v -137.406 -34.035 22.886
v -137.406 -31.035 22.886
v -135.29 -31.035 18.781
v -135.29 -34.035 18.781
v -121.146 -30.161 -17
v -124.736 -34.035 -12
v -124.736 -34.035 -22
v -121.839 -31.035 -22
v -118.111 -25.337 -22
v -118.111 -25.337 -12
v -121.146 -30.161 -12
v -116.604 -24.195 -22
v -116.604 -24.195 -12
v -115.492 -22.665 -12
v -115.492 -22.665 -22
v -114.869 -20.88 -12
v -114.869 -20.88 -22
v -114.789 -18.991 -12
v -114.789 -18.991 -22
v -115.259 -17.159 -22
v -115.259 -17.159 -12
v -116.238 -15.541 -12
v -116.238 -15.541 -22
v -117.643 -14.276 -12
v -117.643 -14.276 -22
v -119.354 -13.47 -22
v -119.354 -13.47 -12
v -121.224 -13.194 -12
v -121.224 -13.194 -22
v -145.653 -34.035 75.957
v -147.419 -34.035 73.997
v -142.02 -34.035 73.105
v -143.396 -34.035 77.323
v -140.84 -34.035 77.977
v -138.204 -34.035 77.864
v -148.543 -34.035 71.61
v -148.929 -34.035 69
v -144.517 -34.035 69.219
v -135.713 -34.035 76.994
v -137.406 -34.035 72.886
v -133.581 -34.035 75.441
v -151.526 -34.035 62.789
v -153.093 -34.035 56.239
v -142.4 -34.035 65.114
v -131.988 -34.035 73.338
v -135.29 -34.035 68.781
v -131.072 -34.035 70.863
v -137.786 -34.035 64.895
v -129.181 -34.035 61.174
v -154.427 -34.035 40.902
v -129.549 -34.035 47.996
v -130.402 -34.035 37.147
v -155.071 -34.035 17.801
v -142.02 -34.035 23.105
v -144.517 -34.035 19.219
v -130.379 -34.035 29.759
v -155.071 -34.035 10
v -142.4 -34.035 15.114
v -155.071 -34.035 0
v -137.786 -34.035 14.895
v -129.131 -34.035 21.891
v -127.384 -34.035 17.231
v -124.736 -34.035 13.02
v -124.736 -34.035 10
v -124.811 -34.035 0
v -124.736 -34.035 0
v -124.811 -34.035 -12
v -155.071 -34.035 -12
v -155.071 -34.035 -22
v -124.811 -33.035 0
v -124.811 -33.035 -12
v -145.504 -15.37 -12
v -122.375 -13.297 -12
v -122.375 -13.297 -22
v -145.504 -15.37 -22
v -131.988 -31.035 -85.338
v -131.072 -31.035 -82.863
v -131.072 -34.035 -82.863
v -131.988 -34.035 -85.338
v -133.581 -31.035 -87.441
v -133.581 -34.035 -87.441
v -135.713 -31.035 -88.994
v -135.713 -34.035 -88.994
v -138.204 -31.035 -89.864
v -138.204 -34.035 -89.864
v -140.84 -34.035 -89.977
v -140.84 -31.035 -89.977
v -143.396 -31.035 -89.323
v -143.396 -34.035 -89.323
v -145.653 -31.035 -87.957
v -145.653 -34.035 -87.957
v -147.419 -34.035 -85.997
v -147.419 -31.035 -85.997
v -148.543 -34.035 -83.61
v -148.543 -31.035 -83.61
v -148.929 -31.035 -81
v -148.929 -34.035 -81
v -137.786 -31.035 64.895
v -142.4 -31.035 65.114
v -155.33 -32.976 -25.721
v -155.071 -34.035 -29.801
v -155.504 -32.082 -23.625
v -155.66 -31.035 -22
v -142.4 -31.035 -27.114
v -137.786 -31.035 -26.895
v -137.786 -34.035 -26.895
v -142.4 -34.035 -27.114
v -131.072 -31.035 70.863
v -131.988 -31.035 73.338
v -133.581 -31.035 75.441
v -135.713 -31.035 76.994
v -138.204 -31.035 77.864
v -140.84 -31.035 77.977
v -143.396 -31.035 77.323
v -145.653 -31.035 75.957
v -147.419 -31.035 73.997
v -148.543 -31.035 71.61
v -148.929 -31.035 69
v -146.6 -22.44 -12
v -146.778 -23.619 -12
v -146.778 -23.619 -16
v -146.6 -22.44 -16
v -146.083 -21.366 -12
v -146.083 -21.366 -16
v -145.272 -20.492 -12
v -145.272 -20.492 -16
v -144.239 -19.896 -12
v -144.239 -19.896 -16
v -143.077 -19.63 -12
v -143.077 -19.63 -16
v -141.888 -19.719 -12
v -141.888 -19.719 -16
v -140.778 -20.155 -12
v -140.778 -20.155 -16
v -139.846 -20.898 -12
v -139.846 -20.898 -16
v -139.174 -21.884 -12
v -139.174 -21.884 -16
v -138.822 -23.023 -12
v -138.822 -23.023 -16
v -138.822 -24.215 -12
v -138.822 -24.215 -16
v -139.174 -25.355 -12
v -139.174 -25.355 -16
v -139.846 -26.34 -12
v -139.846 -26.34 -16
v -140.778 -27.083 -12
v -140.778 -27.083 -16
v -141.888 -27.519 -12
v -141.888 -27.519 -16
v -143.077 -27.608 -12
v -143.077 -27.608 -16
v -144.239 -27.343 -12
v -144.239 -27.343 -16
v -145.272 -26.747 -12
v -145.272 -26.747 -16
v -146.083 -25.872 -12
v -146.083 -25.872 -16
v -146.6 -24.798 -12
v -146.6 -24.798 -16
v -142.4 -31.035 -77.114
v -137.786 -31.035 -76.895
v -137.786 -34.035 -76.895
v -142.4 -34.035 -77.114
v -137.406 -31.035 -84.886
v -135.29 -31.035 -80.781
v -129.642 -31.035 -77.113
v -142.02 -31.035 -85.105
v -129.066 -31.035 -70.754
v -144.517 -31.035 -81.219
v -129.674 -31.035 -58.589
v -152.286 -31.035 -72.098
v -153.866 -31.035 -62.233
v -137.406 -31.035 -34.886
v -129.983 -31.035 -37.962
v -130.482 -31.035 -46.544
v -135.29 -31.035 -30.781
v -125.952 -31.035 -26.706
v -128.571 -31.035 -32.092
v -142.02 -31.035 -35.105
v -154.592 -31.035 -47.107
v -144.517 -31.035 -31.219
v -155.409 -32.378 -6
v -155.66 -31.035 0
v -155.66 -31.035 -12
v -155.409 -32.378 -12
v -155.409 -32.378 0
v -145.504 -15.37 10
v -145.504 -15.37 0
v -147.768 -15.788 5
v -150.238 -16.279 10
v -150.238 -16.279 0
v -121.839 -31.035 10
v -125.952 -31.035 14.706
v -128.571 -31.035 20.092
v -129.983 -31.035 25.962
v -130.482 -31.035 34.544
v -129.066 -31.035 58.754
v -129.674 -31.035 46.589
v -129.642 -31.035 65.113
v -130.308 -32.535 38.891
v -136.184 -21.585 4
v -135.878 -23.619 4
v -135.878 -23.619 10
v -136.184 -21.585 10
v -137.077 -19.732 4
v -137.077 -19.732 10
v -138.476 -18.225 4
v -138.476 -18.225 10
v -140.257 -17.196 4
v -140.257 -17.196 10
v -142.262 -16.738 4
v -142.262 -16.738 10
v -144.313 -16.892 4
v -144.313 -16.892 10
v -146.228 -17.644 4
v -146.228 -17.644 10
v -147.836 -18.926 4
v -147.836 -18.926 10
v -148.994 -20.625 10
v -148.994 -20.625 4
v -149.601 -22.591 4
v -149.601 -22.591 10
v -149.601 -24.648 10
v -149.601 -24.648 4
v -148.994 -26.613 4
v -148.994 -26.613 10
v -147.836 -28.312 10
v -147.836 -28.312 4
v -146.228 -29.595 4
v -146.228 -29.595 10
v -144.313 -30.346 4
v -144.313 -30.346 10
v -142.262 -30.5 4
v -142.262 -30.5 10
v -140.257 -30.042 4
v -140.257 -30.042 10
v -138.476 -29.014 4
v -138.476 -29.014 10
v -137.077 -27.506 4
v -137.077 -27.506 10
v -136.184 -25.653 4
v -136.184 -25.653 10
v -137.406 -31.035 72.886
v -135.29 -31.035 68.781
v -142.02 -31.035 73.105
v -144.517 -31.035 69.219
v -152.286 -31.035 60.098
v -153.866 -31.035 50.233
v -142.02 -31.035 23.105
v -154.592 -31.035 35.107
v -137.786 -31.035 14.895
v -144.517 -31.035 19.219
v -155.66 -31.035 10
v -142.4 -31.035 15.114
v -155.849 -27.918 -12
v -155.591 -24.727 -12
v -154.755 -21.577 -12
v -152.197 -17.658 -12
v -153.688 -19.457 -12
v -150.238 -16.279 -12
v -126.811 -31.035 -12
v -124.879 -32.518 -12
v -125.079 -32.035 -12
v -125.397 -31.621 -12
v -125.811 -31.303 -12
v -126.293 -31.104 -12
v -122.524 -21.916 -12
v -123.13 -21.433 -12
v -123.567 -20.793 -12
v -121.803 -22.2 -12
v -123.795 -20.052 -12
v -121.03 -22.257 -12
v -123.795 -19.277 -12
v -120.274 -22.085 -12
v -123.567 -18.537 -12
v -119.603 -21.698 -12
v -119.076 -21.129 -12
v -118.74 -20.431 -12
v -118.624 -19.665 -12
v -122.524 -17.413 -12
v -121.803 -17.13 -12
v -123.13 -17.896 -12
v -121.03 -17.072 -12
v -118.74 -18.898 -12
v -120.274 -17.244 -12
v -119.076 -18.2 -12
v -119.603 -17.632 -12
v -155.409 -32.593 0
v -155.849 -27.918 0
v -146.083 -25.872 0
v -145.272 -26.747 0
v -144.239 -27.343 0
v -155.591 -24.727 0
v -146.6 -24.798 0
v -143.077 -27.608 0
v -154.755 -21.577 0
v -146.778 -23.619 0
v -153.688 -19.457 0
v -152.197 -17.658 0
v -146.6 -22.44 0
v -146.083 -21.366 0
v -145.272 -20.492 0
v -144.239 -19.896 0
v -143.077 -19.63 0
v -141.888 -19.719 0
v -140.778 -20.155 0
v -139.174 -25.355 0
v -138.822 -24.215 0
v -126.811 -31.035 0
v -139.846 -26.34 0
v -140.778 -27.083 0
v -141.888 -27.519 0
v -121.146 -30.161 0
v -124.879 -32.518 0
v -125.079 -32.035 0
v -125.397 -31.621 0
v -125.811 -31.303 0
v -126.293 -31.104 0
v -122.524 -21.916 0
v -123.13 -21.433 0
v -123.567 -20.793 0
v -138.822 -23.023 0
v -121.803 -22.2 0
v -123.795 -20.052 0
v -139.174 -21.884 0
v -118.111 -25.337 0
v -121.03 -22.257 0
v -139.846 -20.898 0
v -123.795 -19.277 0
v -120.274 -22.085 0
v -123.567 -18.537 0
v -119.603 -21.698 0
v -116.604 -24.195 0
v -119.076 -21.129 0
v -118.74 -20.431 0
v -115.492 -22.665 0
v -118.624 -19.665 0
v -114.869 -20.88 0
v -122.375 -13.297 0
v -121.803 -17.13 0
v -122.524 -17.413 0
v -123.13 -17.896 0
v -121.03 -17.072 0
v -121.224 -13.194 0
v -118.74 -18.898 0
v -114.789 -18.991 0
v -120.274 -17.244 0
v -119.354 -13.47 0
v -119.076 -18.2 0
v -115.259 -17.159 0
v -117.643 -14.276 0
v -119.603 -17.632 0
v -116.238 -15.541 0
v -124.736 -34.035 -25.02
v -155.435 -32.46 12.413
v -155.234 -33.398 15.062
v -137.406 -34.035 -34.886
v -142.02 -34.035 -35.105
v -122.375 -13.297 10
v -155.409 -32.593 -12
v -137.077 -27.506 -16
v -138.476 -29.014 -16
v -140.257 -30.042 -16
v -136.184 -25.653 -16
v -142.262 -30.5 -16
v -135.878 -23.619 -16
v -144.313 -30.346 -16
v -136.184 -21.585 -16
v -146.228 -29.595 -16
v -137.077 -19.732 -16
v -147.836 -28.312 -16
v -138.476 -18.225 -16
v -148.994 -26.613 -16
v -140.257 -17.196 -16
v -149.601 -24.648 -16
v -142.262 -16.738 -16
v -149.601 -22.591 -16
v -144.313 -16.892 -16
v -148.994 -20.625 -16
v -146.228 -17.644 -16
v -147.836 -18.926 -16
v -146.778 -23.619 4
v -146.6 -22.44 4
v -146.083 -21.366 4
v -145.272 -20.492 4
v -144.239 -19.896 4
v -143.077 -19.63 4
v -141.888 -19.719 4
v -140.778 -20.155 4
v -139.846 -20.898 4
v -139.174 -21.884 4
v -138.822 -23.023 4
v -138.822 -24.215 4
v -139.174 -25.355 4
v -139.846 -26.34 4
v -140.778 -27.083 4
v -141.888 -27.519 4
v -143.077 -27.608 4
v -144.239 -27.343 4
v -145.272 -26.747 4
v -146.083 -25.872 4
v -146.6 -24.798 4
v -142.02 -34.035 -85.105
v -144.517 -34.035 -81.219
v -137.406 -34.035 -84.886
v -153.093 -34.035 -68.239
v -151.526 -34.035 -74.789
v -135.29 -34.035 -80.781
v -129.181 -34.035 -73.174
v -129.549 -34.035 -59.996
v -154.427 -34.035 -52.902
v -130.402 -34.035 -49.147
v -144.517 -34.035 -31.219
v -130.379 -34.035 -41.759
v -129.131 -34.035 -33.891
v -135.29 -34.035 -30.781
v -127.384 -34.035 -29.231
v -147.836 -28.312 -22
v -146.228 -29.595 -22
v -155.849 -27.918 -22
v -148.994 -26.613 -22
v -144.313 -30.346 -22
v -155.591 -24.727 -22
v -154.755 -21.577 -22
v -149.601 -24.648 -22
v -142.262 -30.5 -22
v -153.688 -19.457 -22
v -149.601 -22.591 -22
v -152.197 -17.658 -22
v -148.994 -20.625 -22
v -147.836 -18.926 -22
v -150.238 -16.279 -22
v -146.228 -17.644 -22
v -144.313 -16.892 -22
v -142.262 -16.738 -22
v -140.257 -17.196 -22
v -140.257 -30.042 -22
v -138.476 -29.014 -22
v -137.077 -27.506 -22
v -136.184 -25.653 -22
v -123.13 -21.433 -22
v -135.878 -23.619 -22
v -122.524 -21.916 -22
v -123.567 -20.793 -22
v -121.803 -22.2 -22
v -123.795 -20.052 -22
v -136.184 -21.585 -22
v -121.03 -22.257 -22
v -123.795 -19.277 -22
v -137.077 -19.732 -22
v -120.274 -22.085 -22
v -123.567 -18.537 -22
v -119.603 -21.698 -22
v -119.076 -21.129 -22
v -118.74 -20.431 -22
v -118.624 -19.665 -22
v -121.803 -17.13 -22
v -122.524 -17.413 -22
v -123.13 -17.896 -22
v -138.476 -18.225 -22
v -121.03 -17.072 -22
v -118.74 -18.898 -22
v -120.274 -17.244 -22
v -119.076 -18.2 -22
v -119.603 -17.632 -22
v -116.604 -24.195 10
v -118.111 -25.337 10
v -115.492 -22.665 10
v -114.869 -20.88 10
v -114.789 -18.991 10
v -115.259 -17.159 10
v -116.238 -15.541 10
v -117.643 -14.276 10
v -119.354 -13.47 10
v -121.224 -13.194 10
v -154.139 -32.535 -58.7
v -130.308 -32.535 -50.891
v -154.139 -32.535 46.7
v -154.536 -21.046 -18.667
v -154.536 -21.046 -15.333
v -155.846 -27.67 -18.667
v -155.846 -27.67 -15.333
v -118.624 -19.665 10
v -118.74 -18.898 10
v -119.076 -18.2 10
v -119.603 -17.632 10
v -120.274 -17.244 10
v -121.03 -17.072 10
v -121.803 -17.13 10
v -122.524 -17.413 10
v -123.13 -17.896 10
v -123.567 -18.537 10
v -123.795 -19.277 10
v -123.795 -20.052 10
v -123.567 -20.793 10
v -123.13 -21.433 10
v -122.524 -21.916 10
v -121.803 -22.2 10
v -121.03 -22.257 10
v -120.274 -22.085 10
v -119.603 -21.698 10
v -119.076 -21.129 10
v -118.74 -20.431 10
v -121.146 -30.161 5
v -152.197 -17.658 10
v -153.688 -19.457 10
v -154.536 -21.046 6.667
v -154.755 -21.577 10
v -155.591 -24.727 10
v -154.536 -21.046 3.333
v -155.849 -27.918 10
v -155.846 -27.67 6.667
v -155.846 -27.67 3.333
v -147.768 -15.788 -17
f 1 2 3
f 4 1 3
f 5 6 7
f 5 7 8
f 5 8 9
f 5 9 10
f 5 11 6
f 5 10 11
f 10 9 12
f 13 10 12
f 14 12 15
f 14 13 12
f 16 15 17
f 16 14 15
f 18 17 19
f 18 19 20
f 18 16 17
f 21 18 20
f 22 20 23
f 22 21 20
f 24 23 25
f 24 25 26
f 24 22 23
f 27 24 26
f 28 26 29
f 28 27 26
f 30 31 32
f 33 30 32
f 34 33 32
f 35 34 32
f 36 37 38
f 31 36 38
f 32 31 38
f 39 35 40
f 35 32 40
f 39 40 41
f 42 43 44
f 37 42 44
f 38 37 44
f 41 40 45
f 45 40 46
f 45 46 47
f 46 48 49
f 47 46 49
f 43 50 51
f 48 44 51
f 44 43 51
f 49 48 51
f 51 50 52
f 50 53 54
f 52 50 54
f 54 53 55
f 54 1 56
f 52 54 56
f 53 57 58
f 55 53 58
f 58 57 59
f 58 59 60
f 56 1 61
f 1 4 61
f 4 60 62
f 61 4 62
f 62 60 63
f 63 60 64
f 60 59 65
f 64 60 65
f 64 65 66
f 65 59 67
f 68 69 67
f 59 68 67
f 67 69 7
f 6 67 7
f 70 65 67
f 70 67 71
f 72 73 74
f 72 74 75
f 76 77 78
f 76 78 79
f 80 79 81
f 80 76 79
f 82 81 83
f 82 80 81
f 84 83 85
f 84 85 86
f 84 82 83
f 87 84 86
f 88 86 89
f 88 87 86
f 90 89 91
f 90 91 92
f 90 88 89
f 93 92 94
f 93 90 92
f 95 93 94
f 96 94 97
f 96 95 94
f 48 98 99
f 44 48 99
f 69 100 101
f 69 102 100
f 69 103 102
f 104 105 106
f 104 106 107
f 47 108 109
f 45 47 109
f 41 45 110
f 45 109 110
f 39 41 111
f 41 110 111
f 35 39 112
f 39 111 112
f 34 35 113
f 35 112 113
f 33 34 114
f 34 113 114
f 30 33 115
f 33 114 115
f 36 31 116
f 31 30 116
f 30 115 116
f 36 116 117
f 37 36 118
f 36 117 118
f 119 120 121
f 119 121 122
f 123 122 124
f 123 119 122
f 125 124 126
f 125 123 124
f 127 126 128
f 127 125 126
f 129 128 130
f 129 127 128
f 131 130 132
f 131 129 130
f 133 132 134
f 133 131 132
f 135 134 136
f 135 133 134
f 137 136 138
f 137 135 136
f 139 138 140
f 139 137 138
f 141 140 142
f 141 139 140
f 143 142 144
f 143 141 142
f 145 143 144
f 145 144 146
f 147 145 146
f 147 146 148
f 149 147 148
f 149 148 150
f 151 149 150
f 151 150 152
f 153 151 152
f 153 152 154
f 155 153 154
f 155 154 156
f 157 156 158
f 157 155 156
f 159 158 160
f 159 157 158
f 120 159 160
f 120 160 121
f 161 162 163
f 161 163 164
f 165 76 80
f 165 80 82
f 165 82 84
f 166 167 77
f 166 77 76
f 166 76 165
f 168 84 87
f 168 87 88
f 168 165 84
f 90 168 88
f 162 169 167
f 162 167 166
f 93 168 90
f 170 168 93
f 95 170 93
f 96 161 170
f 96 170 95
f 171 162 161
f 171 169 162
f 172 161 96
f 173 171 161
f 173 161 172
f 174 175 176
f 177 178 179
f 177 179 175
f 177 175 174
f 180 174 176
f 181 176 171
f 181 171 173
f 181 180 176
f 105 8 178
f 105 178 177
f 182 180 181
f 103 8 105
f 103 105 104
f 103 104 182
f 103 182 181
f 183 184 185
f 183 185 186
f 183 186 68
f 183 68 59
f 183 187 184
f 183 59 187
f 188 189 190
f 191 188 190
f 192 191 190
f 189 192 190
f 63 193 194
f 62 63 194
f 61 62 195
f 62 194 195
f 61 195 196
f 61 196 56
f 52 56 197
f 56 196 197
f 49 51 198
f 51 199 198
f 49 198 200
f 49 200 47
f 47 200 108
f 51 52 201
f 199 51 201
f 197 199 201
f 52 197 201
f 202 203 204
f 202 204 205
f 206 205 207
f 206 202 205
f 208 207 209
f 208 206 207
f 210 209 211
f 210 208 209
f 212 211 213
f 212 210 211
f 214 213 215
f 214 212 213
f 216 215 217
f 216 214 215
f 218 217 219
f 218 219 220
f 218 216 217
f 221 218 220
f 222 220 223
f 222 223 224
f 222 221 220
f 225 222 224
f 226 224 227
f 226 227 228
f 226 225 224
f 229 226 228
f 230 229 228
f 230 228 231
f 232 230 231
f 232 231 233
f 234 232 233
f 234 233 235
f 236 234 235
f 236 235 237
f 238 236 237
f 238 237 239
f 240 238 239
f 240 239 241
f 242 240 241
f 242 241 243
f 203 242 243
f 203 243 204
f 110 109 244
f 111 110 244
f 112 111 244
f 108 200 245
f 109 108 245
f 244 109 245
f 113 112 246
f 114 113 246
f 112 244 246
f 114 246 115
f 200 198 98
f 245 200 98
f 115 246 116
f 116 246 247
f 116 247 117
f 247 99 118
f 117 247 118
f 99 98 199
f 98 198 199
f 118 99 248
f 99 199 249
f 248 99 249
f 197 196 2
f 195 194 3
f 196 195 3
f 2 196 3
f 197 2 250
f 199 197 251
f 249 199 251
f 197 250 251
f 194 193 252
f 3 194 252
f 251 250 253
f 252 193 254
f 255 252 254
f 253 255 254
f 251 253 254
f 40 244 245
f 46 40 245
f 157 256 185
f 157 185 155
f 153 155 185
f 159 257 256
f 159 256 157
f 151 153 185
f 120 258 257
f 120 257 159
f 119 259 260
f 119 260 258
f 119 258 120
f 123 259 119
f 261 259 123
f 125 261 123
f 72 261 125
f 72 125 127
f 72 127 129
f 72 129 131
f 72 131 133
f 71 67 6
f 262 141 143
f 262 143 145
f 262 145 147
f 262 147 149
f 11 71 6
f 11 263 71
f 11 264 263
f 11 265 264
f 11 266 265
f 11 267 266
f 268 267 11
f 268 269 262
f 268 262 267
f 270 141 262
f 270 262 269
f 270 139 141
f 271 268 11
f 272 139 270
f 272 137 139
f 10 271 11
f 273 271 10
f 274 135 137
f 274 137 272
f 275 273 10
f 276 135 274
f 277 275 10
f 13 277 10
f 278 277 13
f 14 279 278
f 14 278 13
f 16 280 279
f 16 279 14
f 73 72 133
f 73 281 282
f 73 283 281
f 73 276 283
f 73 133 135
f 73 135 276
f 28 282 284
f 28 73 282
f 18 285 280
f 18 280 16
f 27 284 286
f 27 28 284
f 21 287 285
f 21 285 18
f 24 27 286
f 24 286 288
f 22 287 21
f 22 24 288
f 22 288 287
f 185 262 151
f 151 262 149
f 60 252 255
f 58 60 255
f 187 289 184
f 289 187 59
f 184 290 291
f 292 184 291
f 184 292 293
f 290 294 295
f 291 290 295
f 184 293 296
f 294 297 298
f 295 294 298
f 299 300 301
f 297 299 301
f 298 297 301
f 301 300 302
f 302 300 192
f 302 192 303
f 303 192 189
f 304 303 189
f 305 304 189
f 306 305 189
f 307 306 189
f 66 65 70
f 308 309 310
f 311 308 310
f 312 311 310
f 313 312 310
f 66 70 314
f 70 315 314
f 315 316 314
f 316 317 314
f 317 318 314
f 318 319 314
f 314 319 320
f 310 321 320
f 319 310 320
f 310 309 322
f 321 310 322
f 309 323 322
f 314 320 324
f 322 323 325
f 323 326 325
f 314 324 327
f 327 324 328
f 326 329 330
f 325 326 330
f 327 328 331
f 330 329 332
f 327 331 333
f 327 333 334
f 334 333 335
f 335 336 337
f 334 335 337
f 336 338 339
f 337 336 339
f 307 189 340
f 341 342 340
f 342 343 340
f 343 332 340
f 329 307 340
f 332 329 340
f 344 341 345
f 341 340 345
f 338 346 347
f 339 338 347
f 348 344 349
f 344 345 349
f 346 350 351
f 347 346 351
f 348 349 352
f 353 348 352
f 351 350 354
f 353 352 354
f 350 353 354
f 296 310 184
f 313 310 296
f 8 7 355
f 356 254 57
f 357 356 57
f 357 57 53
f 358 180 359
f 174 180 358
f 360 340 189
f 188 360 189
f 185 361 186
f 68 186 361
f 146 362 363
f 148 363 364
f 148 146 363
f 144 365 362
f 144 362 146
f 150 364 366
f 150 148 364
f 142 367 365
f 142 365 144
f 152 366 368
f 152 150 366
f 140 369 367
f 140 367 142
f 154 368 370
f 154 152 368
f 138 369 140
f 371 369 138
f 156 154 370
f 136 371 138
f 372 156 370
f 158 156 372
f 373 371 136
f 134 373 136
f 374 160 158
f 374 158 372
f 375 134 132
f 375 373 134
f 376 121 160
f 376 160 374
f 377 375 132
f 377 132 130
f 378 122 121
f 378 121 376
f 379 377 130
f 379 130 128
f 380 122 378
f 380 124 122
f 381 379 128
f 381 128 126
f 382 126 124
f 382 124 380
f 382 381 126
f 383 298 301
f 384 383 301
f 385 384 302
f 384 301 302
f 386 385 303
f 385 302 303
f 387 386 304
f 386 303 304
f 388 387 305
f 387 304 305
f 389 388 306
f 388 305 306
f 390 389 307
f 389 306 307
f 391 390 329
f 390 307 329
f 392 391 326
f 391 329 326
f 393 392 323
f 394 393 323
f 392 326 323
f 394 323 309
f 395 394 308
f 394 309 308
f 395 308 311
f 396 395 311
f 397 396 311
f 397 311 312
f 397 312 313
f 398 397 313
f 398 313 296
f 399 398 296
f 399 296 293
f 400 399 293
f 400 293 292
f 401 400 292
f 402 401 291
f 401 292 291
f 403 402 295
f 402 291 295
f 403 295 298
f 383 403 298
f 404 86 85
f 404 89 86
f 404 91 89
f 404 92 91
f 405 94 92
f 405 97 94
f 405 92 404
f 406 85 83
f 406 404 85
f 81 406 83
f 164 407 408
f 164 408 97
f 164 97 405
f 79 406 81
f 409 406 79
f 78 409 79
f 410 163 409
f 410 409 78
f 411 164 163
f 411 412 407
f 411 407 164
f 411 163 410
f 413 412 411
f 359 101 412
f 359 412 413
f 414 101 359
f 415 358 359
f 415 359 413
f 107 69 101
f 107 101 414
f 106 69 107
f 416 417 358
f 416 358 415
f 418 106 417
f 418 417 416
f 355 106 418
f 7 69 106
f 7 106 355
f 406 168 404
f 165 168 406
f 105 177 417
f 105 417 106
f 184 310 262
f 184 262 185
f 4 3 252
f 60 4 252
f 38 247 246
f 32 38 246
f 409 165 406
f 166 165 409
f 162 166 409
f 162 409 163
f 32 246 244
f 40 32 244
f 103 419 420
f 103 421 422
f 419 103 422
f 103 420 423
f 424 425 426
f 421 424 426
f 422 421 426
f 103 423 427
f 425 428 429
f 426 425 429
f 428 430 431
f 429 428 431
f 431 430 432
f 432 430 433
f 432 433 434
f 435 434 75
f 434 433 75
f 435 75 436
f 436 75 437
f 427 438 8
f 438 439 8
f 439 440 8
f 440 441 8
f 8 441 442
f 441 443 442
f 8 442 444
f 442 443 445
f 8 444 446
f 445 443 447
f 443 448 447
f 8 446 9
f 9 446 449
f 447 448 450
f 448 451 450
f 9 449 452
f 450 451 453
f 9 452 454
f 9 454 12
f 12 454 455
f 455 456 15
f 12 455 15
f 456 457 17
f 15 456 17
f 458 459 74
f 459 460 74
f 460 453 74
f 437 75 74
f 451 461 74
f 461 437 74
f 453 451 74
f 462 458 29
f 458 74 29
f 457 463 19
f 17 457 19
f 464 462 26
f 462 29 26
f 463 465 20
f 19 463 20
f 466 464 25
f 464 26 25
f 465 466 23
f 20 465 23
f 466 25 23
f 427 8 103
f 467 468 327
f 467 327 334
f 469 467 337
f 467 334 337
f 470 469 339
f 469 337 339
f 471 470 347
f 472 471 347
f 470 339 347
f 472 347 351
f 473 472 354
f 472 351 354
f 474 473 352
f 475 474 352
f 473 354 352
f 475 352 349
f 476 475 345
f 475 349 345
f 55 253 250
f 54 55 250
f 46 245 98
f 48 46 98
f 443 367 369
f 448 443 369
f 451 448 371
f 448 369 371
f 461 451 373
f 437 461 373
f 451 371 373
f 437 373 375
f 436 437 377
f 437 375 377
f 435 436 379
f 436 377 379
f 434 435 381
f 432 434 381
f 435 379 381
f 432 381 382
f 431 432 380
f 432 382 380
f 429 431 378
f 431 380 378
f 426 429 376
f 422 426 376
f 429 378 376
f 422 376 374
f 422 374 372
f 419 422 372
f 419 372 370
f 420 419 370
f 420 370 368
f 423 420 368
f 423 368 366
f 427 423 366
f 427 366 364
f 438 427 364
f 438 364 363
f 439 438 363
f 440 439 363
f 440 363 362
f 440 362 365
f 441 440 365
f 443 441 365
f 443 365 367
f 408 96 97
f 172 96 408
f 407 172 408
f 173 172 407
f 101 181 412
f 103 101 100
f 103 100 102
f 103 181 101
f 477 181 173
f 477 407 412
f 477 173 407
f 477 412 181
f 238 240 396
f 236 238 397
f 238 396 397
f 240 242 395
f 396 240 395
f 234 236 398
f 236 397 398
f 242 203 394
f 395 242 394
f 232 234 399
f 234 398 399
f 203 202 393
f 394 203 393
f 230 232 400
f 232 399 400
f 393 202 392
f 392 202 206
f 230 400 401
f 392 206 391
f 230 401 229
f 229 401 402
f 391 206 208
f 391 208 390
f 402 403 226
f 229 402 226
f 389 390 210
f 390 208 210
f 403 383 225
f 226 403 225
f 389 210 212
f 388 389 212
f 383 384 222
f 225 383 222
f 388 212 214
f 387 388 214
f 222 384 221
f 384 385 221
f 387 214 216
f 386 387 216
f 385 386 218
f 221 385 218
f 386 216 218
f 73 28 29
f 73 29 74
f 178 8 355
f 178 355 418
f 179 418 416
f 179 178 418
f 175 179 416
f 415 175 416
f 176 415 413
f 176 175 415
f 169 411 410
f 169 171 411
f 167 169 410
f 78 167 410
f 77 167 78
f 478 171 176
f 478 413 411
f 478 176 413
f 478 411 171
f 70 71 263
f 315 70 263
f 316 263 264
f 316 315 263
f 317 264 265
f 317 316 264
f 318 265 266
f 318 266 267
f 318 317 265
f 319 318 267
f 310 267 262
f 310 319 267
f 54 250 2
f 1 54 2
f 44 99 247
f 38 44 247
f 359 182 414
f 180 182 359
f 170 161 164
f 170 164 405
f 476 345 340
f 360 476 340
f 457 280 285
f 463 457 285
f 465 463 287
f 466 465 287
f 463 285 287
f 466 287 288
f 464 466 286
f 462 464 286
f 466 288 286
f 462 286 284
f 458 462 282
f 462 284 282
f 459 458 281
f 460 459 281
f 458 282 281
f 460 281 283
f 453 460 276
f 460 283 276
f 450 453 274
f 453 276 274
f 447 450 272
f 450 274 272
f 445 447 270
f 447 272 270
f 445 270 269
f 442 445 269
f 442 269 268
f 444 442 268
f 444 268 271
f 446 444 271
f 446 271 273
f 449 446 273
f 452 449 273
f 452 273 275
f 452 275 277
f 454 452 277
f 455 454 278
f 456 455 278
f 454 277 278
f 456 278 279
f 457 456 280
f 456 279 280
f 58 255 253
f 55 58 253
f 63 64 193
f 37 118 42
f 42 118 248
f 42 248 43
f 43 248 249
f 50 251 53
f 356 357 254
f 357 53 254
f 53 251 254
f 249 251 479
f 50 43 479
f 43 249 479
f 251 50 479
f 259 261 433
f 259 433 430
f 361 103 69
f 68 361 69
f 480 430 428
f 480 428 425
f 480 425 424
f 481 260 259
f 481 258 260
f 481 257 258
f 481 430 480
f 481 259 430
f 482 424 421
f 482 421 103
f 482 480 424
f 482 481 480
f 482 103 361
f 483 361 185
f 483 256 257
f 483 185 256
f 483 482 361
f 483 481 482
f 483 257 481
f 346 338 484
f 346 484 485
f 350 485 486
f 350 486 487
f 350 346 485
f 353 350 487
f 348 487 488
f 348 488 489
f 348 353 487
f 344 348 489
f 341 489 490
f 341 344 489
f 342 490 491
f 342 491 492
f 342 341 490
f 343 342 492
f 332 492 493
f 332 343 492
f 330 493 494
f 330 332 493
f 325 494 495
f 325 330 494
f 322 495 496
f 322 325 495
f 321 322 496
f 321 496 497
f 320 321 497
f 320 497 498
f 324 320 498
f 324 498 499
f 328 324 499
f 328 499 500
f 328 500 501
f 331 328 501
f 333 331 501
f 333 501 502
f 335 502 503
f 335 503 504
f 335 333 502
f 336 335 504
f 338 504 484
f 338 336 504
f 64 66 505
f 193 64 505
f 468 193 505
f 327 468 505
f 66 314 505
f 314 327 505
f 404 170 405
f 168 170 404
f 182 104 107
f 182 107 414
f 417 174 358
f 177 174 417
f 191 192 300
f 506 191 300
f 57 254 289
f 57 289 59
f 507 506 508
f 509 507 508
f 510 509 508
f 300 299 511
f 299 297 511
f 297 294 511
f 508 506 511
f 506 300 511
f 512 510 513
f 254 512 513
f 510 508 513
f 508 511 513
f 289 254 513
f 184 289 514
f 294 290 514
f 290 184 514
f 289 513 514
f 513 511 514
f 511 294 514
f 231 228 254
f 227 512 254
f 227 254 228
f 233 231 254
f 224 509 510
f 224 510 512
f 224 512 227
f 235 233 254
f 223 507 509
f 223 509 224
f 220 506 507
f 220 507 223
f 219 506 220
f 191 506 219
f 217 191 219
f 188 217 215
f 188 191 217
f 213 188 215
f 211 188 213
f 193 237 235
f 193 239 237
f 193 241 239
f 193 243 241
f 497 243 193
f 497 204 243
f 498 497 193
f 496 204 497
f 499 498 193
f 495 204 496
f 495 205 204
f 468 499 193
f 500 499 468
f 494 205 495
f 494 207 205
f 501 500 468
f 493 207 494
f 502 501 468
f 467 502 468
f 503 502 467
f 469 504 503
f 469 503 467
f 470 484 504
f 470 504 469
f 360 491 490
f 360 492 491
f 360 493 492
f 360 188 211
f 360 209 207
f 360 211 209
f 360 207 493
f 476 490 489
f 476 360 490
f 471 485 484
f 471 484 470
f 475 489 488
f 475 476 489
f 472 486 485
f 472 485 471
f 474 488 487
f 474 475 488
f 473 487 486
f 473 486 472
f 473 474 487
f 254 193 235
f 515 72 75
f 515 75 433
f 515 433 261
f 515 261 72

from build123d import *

# Parameters (mm, degrees)
SKETCH1_R           = 6.9
SKETCH1_R_2         = 2.6
BOSS_EXTRUDE1_DEPTH = 10
BOSS_EXTRUDE2_DEPTH = 12
SKETCH3_R           = 7
SKETCH3_R_2         = 4
BOSS_EXTRUDE3_DEPTH = 4
BOSS_EXTRUDE4_DEPTH = 84
BOSS_EXTRUDE5_DEPTH = 84
CUT_EXTRUDE1_DEPTH  = 190.323263107


with BuildPart() as part:
    # Sketch1 → Boss-Extrude1 (new body)
    with BuildSketch(Plane.XY):
        with BuildLine():
            Line((-155.070766667, -34.03543395), (-139.182010536, -34.03543395))
            Line((-139.182010536, -34.03543395), (-124.735717634, -34.03543395))
            add(Edge.make_bspline(
                [(-124.735717634, -34.03543395), (-120.868070652, -30.634901056), (-118.110731489, -25.337058748)],
                knots=[0.604913823, 0.604913823, 0.604913823, 1, 1, 1], degree=2))
            ThreePointArc((-118.110731489, -25.337058748), (-114.956411592, -18.057608365), (-121.224300514, -13.194101363))
            Line((-121.224300514, -13.194101363), (-122.374915538, -13.297224598))
            Line((-122.374915538, -13.297224598), (-145.504342678, -15.370186717))
            add(Edge.make_bspline(
                [(-145.504342678, -15.370186717), (-147.665446471, -15.751951197), (-150.237941893, -16.278752791)],
                knots=[0, 0, 0, 0.143499102, 0.143499102, 0.143499102], degree=2))
            add(Edge.make_bspline(
                [(-150.237941893, -16.278752791), (-156.331446907, -19.412430802), (-156.587305002, -28.504886835), (-155.070766667, -34.03543395)],
                knots=[0, 0, 0, 0, 1, 1, 1, 1], degree=3))
        make_face()
        with Locations((-142.777717077, -23.619181221)):
            Circle(SKETCH1_R, mode=Mode.SUBTRACT)
        with Locations((-121.224300514, -19.664754316)):
            Circle(SKETCH1_R_2, mode=Mode.SUBTRACT)
    boss_extrude1 = extrude(amount=BOSS_EXTRUDE1_DEPTH)

    # Sketch2 → Boss-Extrude2 (add)
    with BuildSketch(Plane(origin=(0, 0, 0), x_dir=(-1, 0, 0), z_dir=(0, 0, -1))):
        with BuildLine():
            Line((124.810828249, -34.03543395), (124.810828249, -33.03543395))
            ThreePointArc((124.810828249, -33.03543395), (125.396614687, -31.621220388), (126.810828249, -31.03543395))
            Line((126.810828249, -31.03543395), (155.660238601, -31.03543395))
            add(Edge.make_bspline(
                [(155.660238601, -31.03543395), (155.453340821, -32.220849379), (155.070766667, -34.03543395)],
                knots=[0.469279702, 0.469279702, 0.469279702, 1.113861257, 1.113861257, 1.113861257], degree=2))
            Line((155.070766667, -34.03543395), (124.810828249, -34.03543395))
        make_face()
    extrude(amount=BOSS_EXTRUDE2_DEPTH)

    # Mirror1: Boss-Extrude1 across plane
    add(boss_extrude1.mirror(Plane(origin=(0, 0, -6), x_dir=(1, 0, 0), z_dir=(0, 0, -1))))

    # Sketch3 → Boss-Extrude3 (add)
    with BuildSketch(Plane(origin=(0, 0, 0), x_dir=(-1, 0, 0), z_dir=(0, 0, -1))):
        with Locations((142.777717077, -23.619181221)):
            Circle(SKETCH3_R)
        with Locations((142.777717077, -23.619181221)):
            Circle(SKETCH3_R_2, mode=Mode.SUBTRACT)
    boss_extrude3 = extrude(amount=-BOSS_EXTRUDE3_DEPTH)

    # Mirror2: Boss-Extrude3 across plane
    add(boss_extrude3.mirror(Plane(origin=(0, 0, -6), x_dir=(1, 0, 0), z_dir=(0, 0, -1))))

    # Sketch4 → Boss-Extrude4 (add)
    with BuildSketch(Plane.XY.offset(10)):
        with BuildLine():
            add(Edge.make_bspline(
                [(-155.660238601, -31.03543395), (-155.52477055, -32.104378324), (-155.322110933, -33.11882586), (-155.070766667, -34.03543395)],
                knots=[0.834264482, 0.834264482, 0.834264482, 0.834264482, 1, 1, 1, 1], degree=3))
            Line((-155.070766667, -34.03543395), (-124.735717634, -34.03543395))
            add(Edge.make_bspline(
                [(-124.735717634, -34.03543395), (-123.199822379, -32.685036057), (-121.8390218, -31.03543395)],
                knots=[0, 0, 0, 1, 1, 1], degree=2))
            Line((-121.8390218, -31.03543395), (-155.660238601, -31.03543395))
        make_face()
    extrude(amount=BOSS_EXTRUDE4_DEPTH)

    # Sketch5 → Boss-Extrude5 (add)
    with BuildSketch(Plane(origin=(0, 0, -22), x_dir=(-1, 0, 0), z_dir=(0, 0, -1))):
        with BuildLine():
            Line((155.070766667, -34.03543395), (124.735717633, -34.035433949))
            add(Edge.make_bspline(
                [(124.735717633, -34.035433949), (123.199822378, -32.685036056), (121.8390218, -31.03543395)],
                knots=[0, 0, 0, 1, 1, 1], degree=2))
            Line((121.8390218, -31.03543395), (155.660238601, -31.03543395))
            add(Edge.make_bspline(
                [(155.660238601, -31.03543395), (155.52477055, -32.104378324), (155.322110933, -33.11882586), (155.070766667, -34.03543395)],
                knots=[0.834264482, 0.834264482, 0.834264482, 0.834264482, 1, 1, 1, 1], degree=3))
        make_face()
    extrude(amount=BOSS_EXTRUDE5_DEPTH)

    # Sketch6 → Cut-Extrude1 (cut, through all)
    with BuildSketch(Plane(origin=(0, -31.03543395, 0), x_dir=(1, 0, 0), z_dir=(0, 1, 0))):
        Polygon((-137.786415389, 76.894835229), (-142.400005748, 77.114191864), (-144.516832509, 81.219356636), (-142.02006891, 85.105164771), (-137.406478551, 84.885808136), (-135.289651791, 80.780643364), align=None)
        Polygon((-135.289651791, 30.780643364), (-137.786415389, 26.894835229), (-142.400005748, 27.114191864), (-144.516832509, 31.219356636), (-142.02006891, 35.105164771), (-137.406478551, 34.885808136), align=None)
        with BuildLine():
            Line((-155.6602386, 22), (-173.465321409, 22))
            Line((-173.465321409, 22), (-173.465321409, 117.834139367))
            Line((-173.465321409, 117.834139367), (-100.430925903, 117.834139367))
            Line((-100.430925903, 117.834139367), (-121.8390218, 22))
            add(Edge.make_bspline(
                [(-121.8390218, 22), (-130.237957541, 29.288236007), (-131.708688401, 51.819501052), (-127.475857655, 72.230953717), (-131.071963897, 82.863468574)],
                knots=[0, 0, 0, 0, 0.490729359, 1, 1, 1, 1], degree=3))
            ThreePointArc((-131.071963897, 82.863468574), (-140.840035974, 89.976993263), (-148.928982602, 81))
            add(Edge.make_bspline(
                [(-148.928982602, 81), (-152.625386512, 74.081760345), (-155.262352814, 54.105117148), (-154.402874629, 34.24459948), (-155.6602386, 22)],
                knots=[0, 0, 0, 0, 0.385424941, 1, 1, 1, 1], degree=3))
        make_face()
        with BuildLine():
            Line((-100.430925903, -105.834139367), (-121.8390218, -10))
            add(Edge.make_bspline(
                [(-121.8390218, -10), (-130.237957541, -17.288236007), (-131.708688401, -39.819501052), (-127.475857655, -60.230953717), (-131.071963897, -70.863468574)],
                knots=[0, 0, 0, 0, 0.490729359, 1, 1, 1, 1], degree=3))
            ThreePointArc((-131.071963897, -70.863468574), (-140.840035974, -77.976993263), (-148.928982602, -69))
            add(Edge.make_bspline(
                [(-148.928982602, -69), (-152.625386512, -62.081760345), (-155.262352814, -42.105117148), (-154.402874629, -22.24459948), (-155.6602386, -10)],
                knots=[0, 0, 0, 0, 0.385424941, 1, 1, 1, 1], degree=3))
            Line((-155.6602386, -10), (-173.465321409, -10))
            Line((-173.465321409, -10), (-173.465321409, -105.834139367))
            Line((-173.465321409, -105.834139367), (-100.430925903, -105.834139367))
        make_face()
        Polygon((-142.02006891, -23.105164771), (-137.406478551, -22.885808136), (-135.289651791, -18.780643364), (-137.786415389, -14.894835229), (-142.400005748, -15.114191864), (-144.516832509, -19.219356636), align=None)
        Polygon((-135.289651791, -68.780643364), (-137.786415389, -64.894835229), (-142.400005748, -65.114191864), (-144.516832509, -69.219356636), (-142.02006891, -73.105164771), (-137.406478551, -72.885808136), align=None)
    extrude(amount=-CUT_EXTRUDE1_DEPTH, mode=Mode.SUBTRACT)


solid = part.part
